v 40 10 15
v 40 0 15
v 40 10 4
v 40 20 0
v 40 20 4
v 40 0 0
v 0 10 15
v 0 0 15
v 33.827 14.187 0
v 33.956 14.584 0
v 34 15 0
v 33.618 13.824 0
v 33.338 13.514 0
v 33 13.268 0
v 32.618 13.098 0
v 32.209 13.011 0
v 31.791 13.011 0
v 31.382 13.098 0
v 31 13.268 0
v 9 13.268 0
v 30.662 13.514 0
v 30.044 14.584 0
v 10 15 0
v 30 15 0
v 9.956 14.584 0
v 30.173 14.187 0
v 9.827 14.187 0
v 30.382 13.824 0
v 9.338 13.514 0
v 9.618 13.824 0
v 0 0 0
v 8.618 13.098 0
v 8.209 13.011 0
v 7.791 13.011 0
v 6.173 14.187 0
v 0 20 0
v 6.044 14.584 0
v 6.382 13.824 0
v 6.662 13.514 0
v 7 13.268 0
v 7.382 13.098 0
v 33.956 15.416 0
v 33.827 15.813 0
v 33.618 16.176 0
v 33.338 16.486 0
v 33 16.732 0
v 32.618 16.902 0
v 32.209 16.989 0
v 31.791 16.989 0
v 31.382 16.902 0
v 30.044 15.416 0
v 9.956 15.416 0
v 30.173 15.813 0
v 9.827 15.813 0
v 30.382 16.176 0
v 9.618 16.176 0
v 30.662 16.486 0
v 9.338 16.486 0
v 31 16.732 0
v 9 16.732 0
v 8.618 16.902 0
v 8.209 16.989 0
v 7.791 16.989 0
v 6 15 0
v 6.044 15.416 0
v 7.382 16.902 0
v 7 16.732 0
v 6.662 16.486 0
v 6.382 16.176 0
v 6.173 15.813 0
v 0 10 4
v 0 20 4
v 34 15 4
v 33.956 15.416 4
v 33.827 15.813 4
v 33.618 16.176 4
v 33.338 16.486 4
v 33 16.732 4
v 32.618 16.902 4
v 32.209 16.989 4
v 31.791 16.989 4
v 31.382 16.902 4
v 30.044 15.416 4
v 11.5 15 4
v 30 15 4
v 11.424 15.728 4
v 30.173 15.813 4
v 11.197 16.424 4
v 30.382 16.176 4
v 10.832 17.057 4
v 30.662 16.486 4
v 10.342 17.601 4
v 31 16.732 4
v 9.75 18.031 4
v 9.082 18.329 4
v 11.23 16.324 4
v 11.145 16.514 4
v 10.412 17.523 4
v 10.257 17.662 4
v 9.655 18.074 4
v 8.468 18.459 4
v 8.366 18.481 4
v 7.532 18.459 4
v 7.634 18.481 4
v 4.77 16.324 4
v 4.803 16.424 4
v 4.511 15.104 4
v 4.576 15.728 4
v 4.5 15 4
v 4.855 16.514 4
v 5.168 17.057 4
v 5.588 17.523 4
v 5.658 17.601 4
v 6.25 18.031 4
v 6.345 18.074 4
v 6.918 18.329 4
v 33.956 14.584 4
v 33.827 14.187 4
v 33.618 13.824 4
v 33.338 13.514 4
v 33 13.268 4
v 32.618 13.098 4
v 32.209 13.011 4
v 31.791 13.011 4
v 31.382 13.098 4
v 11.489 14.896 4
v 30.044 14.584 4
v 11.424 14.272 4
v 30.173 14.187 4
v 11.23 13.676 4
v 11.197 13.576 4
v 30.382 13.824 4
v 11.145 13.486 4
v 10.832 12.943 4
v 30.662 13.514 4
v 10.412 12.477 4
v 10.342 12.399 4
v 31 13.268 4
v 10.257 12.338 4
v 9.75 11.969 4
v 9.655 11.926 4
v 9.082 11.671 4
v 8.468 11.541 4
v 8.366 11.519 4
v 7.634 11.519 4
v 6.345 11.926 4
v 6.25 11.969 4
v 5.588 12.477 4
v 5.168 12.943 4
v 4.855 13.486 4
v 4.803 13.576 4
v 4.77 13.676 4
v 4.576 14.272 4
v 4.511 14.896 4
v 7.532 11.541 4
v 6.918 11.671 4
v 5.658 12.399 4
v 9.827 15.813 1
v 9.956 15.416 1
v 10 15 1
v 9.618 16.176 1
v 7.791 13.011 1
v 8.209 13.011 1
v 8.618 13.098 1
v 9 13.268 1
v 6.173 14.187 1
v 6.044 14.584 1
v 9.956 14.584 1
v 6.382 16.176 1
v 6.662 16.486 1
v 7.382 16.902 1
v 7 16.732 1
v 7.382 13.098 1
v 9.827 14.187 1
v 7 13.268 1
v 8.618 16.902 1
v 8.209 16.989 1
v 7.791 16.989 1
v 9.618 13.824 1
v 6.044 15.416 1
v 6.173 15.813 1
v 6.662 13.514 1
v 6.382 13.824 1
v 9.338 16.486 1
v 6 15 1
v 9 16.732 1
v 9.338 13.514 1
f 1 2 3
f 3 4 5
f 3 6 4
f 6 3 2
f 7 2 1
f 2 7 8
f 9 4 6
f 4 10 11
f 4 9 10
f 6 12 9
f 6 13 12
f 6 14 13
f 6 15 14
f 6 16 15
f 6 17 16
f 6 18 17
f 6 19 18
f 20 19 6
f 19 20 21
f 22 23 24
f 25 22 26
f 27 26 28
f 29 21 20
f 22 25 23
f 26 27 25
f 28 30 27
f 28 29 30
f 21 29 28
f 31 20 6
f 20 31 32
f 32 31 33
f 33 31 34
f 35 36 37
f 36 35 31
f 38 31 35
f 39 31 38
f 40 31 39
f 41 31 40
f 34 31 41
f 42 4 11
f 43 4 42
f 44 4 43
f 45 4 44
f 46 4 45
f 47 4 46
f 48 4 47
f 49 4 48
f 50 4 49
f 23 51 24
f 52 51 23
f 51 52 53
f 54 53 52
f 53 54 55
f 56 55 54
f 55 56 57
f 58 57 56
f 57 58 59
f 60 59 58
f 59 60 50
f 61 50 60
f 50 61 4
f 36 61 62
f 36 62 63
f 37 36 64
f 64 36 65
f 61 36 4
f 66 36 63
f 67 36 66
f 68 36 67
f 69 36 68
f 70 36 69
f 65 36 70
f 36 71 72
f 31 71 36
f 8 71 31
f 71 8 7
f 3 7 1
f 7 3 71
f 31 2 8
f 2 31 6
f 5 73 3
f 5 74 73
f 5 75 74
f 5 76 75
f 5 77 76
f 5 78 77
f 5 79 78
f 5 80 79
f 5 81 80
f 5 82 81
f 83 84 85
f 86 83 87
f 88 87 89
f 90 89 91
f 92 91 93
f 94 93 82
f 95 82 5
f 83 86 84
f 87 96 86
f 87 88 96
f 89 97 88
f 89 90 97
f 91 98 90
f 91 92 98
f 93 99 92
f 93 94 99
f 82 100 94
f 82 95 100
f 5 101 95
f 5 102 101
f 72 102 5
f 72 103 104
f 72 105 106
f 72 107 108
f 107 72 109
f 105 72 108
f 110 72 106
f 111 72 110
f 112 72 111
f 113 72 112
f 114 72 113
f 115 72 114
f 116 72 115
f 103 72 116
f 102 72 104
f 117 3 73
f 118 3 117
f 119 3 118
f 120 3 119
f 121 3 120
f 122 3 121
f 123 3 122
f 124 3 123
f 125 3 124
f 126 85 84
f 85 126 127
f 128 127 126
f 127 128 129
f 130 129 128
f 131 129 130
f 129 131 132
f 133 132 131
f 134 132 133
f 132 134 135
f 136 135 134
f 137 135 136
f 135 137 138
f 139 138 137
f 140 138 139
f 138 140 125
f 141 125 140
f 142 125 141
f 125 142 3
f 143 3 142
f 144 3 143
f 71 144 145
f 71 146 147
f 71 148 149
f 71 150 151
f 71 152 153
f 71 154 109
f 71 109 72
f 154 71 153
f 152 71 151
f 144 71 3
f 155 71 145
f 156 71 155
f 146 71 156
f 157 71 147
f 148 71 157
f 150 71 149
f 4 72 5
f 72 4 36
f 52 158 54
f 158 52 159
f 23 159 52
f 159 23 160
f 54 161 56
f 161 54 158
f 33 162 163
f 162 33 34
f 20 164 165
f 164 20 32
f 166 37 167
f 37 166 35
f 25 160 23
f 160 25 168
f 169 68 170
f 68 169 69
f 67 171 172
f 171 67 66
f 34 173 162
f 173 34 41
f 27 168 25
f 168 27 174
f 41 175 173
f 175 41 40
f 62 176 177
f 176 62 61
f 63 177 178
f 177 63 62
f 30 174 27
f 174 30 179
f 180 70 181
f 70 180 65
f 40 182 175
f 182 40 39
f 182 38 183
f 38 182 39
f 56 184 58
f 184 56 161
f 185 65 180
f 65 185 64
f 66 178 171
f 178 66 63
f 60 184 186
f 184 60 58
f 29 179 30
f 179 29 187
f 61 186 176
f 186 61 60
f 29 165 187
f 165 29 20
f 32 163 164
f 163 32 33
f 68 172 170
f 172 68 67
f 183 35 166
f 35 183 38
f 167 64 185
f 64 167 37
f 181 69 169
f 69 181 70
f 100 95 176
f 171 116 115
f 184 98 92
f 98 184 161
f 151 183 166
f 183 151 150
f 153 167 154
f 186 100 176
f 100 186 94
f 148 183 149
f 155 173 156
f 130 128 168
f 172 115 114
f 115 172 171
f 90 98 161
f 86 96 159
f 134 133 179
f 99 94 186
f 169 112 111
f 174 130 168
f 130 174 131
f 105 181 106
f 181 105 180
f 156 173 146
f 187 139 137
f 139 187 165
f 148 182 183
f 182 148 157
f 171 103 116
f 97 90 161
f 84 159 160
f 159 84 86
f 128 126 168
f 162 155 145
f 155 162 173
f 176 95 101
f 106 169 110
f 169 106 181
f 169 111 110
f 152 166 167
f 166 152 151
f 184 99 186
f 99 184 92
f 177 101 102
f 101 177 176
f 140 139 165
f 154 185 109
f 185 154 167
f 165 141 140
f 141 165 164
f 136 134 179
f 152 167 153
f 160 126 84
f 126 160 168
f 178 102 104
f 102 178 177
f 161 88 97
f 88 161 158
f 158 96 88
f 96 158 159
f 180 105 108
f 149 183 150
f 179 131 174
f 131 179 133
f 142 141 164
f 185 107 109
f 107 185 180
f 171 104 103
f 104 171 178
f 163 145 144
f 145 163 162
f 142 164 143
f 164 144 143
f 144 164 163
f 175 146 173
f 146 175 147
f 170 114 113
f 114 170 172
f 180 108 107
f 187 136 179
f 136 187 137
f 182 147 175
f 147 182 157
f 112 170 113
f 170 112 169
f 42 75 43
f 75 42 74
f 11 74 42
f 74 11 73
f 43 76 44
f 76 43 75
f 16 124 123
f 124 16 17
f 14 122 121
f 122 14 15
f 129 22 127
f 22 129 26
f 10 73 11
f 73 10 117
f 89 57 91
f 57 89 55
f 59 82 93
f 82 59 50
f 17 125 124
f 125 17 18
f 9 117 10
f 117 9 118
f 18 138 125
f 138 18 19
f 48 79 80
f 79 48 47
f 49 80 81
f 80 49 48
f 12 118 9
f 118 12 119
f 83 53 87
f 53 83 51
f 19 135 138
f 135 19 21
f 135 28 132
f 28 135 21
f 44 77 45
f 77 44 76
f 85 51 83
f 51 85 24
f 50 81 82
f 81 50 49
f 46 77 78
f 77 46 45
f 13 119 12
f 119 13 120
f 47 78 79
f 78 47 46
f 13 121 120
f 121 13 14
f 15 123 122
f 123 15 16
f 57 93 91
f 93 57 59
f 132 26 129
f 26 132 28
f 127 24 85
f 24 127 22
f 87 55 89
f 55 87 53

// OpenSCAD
$fn = 30;

difference() {

union() {
    cube([40, 10, 15]);
    cube([40, 20, 4]);
}
color("red")
translate([8, 15, -1])
cylinder(h=6, d=4, center=false);

color("pink")
translate([8, 15, 1])
cylinder(h=4, d1=4, d2=8, center=false);



color("red")
translate([32, 15, -1])
cylinder(h=6, d=4, center=false);

}
